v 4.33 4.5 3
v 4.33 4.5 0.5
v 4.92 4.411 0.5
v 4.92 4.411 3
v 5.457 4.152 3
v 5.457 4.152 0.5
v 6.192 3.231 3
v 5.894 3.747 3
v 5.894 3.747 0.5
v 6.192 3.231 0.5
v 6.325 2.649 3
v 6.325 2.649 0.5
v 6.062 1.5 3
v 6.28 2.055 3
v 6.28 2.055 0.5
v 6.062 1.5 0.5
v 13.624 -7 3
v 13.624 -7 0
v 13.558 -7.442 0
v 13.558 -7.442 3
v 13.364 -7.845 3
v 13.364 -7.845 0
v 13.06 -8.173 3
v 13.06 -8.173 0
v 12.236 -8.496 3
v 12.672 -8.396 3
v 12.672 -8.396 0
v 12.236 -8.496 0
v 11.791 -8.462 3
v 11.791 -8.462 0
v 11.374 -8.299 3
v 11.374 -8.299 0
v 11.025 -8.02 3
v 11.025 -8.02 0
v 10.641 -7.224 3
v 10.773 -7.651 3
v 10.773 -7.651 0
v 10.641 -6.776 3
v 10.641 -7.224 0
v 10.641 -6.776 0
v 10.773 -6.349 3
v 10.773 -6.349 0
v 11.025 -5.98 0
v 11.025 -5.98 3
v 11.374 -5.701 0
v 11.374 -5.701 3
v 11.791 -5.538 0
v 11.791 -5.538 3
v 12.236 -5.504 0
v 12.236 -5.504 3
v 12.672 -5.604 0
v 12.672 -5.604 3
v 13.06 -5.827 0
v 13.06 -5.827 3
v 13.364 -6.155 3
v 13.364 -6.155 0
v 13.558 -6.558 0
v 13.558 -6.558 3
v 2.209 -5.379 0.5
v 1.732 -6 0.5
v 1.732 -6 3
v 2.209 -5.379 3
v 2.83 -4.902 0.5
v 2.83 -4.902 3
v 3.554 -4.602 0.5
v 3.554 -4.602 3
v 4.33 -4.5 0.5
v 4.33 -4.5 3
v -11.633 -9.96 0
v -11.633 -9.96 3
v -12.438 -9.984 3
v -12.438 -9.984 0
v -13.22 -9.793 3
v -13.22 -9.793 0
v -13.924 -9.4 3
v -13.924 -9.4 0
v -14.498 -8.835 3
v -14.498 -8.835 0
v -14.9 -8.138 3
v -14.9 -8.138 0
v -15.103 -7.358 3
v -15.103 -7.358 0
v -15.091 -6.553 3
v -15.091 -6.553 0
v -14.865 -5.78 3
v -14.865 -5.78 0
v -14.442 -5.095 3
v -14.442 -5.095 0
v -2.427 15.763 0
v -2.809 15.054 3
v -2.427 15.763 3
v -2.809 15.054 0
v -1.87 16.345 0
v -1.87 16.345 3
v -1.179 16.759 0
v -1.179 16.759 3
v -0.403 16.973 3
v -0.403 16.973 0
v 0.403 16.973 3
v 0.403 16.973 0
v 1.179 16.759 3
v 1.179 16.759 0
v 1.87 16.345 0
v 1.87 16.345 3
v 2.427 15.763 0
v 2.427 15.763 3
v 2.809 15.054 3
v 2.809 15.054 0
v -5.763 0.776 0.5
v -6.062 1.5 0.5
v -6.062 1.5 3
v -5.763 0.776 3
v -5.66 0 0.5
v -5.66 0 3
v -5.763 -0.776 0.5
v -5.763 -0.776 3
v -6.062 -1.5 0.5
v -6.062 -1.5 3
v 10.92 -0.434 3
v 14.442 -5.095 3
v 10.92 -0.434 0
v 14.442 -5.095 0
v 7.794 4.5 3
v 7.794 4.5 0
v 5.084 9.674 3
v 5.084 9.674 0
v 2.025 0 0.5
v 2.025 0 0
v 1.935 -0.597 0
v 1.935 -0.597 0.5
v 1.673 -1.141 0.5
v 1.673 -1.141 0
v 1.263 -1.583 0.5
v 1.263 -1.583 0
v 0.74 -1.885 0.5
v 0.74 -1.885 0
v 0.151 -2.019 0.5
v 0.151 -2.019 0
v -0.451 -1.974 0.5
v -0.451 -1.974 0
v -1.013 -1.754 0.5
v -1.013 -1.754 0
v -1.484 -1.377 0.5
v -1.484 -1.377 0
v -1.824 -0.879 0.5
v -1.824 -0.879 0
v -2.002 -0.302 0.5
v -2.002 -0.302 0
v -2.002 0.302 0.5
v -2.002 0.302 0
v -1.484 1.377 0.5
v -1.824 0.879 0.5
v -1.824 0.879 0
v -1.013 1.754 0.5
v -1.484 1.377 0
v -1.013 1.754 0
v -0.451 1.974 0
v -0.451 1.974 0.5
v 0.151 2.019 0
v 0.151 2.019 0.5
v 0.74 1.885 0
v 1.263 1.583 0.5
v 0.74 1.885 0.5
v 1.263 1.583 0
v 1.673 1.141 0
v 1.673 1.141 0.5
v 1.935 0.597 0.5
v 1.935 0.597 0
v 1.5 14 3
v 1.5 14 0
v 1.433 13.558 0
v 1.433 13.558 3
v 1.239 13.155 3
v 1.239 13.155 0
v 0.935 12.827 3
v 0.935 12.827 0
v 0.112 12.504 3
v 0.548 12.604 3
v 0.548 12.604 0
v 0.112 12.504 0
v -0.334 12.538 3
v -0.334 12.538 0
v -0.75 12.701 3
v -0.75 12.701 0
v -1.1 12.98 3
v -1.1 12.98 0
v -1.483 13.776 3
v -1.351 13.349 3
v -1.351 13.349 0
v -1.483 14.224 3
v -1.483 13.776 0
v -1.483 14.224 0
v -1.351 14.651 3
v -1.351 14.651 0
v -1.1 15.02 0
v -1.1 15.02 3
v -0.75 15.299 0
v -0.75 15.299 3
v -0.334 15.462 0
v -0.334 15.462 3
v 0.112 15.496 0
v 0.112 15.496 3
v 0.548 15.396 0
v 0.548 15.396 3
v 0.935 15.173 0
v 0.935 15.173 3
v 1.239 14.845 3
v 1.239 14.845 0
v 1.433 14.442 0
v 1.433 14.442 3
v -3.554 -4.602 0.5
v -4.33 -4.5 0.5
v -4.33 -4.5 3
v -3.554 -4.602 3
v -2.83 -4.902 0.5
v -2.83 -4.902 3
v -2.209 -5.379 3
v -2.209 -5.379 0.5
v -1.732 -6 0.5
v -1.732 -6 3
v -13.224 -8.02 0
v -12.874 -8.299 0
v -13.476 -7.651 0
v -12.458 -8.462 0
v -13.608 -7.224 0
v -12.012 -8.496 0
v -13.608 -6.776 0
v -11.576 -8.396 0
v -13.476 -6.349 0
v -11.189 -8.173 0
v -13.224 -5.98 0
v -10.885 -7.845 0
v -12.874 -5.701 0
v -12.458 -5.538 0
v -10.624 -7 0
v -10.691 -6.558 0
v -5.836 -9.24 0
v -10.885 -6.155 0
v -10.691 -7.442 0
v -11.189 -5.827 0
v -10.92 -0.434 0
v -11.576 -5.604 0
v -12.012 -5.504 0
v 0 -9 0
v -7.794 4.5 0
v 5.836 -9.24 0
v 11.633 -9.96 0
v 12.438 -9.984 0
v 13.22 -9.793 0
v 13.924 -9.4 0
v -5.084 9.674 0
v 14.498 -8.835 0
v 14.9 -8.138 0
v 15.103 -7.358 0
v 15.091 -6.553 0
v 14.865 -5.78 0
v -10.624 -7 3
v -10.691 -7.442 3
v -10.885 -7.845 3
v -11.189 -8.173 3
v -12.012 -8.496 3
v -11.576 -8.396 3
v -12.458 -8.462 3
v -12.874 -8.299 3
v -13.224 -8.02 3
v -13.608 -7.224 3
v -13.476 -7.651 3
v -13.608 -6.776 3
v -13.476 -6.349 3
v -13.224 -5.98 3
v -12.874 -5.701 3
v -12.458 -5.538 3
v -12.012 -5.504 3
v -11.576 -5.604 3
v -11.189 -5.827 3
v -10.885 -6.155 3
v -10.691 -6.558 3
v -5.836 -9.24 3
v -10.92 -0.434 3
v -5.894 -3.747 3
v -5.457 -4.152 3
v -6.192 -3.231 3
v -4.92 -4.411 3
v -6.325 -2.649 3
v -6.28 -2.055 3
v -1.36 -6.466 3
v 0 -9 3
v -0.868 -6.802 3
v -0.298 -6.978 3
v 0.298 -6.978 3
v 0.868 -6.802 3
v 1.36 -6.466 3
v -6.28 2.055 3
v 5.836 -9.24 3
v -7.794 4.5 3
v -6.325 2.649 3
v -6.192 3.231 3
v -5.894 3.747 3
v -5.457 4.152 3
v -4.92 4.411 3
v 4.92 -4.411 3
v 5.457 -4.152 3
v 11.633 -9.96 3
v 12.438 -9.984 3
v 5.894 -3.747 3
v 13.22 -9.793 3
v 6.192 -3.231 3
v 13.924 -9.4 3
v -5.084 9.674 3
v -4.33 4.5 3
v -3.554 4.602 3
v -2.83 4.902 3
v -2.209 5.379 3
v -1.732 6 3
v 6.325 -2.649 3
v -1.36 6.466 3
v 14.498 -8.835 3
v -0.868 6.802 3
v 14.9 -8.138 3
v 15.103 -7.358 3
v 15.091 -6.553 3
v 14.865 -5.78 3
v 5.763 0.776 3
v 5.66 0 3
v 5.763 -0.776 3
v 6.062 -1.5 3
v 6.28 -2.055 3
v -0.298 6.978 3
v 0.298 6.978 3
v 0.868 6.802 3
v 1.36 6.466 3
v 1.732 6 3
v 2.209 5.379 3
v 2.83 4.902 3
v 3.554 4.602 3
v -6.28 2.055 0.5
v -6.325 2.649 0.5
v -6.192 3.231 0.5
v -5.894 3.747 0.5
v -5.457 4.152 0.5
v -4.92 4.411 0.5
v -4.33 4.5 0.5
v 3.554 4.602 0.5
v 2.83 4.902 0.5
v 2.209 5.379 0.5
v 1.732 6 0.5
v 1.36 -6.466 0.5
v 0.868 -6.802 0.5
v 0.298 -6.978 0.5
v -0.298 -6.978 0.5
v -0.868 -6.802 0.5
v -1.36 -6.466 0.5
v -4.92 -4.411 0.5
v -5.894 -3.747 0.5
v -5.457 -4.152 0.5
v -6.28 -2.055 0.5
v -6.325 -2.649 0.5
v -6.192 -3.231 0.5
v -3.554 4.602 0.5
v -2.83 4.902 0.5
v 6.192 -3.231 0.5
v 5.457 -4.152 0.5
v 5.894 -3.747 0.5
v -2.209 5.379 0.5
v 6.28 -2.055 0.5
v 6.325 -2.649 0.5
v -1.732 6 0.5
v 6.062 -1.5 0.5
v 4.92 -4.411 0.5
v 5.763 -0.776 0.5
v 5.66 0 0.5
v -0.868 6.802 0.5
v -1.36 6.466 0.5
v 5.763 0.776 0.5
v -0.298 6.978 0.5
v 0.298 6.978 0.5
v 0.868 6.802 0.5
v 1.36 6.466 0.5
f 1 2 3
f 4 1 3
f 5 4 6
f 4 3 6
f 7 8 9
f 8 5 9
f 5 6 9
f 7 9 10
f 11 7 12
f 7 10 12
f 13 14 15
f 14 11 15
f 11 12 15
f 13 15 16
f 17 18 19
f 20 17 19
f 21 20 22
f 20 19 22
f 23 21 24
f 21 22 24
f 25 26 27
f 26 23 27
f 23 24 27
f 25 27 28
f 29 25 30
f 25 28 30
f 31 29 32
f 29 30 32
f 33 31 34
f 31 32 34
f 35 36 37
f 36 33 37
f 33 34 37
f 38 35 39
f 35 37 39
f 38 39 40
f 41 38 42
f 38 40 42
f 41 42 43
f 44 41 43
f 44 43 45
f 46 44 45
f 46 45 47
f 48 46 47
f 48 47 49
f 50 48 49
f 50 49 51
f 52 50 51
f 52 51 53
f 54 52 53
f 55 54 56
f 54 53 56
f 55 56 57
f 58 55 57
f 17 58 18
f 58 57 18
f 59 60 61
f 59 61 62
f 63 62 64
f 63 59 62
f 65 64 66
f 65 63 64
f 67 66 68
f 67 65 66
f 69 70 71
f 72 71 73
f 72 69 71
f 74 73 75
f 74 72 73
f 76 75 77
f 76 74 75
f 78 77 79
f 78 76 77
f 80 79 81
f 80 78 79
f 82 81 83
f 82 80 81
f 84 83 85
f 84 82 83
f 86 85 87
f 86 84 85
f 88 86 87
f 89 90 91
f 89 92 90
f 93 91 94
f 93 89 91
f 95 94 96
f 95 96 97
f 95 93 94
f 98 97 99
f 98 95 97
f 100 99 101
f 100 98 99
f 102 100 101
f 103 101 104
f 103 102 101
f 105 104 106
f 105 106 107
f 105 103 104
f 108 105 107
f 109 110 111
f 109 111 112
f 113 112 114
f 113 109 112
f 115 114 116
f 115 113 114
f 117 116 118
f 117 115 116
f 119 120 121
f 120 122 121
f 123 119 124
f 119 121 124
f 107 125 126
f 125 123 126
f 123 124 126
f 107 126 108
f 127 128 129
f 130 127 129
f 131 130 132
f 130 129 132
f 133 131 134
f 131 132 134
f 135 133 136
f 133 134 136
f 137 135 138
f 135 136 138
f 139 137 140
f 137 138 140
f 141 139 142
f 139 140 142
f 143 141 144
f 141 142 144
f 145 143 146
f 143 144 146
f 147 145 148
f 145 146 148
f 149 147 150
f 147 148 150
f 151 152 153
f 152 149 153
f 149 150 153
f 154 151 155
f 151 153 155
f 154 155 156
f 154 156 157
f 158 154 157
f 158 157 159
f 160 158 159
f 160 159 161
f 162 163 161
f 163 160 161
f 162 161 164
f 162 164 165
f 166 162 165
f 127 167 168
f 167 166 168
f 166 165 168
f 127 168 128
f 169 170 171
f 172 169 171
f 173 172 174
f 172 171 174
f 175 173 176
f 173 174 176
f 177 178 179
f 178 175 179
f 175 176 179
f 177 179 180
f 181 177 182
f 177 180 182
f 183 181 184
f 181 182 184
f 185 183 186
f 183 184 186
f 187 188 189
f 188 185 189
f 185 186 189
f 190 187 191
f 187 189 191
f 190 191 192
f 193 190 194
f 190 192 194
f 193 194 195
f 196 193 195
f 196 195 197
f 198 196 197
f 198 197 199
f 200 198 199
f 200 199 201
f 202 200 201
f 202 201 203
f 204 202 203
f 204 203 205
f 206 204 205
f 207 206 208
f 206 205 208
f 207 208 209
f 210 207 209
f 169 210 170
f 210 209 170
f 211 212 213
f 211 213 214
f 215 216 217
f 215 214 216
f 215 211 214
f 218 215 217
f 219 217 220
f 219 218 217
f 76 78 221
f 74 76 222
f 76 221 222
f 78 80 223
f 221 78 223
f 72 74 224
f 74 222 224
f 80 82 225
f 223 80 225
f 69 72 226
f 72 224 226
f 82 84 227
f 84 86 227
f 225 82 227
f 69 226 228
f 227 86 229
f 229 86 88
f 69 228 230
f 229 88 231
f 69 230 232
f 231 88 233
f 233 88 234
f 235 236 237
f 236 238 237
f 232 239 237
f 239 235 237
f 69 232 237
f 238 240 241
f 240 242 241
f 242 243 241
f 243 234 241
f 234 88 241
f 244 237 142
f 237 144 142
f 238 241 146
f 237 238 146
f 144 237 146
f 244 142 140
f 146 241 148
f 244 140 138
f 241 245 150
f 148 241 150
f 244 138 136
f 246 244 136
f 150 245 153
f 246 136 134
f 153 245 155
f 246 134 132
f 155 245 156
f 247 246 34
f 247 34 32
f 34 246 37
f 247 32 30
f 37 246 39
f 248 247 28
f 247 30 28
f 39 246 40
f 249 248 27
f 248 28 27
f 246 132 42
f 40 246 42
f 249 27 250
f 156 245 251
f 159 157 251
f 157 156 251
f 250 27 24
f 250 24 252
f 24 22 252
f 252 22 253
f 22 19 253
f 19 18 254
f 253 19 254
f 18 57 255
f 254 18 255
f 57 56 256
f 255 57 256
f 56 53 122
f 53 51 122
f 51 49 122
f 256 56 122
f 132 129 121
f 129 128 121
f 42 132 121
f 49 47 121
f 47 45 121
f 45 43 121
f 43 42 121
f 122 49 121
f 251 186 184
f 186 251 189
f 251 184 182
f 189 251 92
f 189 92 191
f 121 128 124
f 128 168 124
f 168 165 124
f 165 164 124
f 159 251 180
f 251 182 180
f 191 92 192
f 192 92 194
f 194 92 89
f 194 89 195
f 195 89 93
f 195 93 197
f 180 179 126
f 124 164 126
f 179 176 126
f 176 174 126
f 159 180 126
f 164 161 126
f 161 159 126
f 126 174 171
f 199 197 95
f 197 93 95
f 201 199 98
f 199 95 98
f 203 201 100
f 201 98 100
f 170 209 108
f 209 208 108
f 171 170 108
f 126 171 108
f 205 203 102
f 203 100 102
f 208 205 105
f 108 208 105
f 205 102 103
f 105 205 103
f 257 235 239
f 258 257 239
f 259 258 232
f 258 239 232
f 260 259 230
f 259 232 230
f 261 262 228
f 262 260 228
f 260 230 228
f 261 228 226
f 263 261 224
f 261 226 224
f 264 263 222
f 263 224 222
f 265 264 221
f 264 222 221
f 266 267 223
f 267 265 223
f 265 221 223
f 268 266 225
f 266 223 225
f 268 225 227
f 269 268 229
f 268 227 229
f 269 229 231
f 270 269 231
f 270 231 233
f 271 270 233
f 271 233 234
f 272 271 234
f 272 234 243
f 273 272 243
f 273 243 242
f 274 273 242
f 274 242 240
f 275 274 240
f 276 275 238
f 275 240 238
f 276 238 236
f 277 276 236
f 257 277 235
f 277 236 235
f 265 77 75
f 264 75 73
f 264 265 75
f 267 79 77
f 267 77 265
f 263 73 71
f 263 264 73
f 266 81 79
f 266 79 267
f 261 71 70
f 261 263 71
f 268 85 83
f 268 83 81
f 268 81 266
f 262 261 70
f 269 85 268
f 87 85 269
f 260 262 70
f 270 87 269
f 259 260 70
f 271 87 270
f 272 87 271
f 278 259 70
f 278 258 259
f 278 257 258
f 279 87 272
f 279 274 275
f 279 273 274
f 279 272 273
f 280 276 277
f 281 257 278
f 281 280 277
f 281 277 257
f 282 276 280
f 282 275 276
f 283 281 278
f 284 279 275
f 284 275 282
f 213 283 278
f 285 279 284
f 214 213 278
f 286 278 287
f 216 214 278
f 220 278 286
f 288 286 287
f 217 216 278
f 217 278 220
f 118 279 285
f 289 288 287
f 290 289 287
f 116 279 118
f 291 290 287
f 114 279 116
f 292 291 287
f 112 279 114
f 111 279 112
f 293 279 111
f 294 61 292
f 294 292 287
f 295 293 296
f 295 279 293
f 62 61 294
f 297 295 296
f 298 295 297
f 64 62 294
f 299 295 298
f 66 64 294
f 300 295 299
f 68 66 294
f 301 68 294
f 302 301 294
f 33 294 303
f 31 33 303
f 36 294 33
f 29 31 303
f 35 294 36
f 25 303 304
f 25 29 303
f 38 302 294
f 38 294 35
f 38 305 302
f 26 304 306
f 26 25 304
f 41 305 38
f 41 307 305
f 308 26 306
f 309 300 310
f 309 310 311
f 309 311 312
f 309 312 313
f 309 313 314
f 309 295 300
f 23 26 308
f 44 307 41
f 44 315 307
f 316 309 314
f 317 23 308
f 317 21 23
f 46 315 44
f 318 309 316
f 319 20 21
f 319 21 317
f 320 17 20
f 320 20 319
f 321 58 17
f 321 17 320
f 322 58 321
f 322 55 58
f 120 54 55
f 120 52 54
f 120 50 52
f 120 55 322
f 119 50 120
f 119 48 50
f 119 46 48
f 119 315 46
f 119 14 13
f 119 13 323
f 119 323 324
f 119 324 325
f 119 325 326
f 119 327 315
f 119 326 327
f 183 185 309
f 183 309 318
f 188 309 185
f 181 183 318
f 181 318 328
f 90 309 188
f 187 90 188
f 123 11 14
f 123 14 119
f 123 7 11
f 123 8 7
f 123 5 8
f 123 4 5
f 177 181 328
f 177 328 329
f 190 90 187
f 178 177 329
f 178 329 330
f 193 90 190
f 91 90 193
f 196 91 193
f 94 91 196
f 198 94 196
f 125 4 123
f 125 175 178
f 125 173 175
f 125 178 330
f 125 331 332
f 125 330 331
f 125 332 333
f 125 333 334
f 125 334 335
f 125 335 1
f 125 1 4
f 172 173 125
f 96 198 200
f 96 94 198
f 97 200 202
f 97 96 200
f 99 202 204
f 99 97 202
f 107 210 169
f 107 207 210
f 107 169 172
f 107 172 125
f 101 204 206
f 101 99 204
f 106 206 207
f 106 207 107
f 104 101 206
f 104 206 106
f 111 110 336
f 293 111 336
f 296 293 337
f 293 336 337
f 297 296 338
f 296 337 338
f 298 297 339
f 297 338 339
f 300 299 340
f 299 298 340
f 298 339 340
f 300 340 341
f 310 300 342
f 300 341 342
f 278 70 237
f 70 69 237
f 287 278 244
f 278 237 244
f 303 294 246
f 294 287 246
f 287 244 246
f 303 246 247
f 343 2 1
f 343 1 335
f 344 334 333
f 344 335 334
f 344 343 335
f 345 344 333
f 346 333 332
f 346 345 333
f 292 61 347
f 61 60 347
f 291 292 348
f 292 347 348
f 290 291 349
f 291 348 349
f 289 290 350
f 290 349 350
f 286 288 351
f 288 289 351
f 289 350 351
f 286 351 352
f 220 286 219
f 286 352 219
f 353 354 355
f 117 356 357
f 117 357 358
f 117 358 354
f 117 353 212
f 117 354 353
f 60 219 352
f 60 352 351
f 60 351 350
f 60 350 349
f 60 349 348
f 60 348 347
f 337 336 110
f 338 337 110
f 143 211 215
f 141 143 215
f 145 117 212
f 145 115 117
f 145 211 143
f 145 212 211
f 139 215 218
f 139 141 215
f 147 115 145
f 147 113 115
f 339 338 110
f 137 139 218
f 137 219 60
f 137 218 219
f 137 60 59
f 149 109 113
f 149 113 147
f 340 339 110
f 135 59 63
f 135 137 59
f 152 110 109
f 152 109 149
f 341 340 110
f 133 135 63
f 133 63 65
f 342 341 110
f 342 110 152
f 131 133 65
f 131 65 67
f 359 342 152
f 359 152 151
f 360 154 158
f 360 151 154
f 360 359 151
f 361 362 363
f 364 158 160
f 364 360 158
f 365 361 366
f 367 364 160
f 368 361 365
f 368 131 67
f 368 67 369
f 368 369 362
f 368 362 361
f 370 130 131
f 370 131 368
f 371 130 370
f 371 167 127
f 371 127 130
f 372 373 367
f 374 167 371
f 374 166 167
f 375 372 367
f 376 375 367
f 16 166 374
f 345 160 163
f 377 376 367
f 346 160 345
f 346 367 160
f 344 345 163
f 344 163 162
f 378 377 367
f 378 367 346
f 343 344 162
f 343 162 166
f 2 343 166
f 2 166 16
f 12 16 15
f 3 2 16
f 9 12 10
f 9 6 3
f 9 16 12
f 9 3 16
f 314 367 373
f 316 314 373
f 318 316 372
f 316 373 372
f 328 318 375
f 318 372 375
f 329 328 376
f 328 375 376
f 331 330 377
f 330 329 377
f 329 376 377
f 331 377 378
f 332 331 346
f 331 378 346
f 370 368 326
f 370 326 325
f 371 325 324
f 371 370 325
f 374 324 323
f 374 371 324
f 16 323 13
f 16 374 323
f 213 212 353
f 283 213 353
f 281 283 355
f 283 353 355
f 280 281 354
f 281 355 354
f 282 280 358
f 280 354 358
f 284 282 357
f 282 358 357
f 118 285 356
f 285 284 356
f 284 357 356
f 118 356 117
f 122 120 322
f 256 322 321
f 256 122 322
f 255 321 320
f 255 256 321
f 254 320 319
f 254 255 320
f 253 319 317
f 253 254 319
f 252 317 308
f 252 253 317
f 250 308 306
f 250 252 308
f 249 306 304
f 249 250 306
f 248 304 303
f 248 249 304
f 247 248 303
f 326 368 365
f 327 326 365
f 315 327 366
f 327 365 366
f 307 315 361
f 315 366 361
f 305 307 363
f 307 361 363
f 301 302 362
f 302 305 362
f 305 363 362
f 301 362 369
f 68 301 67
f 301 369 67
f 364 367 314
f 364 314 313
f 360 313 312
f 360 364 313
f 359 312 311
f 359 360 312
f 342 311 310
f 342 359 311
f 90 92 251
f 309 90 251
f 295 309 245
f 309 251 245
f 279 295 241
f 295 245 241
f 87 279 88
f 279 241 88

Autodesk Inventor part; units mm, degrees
ref_plane "YZ Plane" through (0, 0, 0) normal (1, 0, 0) x (0, 1, 0)
ref_plane "XZ Plane" through (0, 0, 0) normal (0, 1, 0) x (-1, 0, 0)
ref_plane "XY Plane" through (0, 0, 0) normal (0, 0, 1) x (1, 0, 0)
sketch "スケッチ1" plane through (0, 0, 0) normal (0, 0, 1) x (1, 0, 0)
  circle A0 centre (0, 0) radius 18.25
  circle A1 centre (0, 0) radius 17
  line L0 (0, 14) -> (12.1244, -7) construction
  line L1 (12.1244, -7) -> (-12.1244, -7) construction
  line L2 (-12.1244, -7) -> (0, 14) construction
  circle A2 centre (0, 14) radius 1.5
  circle A3 centre (-12.1244, -7) radius 1.5
  circle A4 centre (12.1244, -7) radius 1.5
  circle A5 centre (0, 14) radius 3
  circle A6 centre (-12.1244, -7) radius 3
  circle A7 centre (12.1244, -7) radius 3
  circle A8 centre (0, 0) radius 8 construction
  circle A9 centre (0, 0) radius 7 construction
  line L3 (0, 7) -> (6.0622, 3.5) construction
  line L4 (6.0622, 3.5) -> (6.0622, -3.5) construction
  line L5 (6.0622, -3.5) -> (0, -7) construction
  line L6 (0, -7) -> (-6.0622, -3.5) construction
  line L7 (-6.0622, -3.5) -> (-6.0622, 3.5) construction
  line L8 (-6.0622, 3.5) -> (0, 7) construction
  arc A10 (1.7321, 6) -> (-1.7321, 6) centre (0, 5) ccw
  arc A11 (-4.3301, 4.5) -> (-6.0622, 1.5) centre (-4.3301, 2.5) ccw
  arc A12 (-6.0622, -1.5) -> (-4.3301, -4.5) centre (-4.3301, -2.5) ccw
  arc A13 (-1.7321, -6) -> (1.7321, -6) centre (0, -5) ccw
  arc A14 (4.3301, -4.5) -> (6.0622, -1.5) centre (4.3301, -2.5) ccw
  arc A15 (6.0622, 1.5) -> (4.3301, 4.5) centre (4.3301, 2.5) ccw
  arc A16 (1.7321, 6) -> (4.3301, 4.5) centre (4.3301, 7.5) ccw
  arc A17 (-4.3301, 4.5) -> (-1.7321, 6) centre (-4.3301, 7.5) ccw
  arc A18 (-6.0622, -1.5) -> (-6.0622, 1.5) centre (-8.6603, 0) ccw
  arc A19 (-1.7321, -6) -> (-4.3301, -4.5) centre (-4.3301, -7.5) ccw
  arc A20 (4.3301, -4.5) -> (1.7321, -6) centre (4.3301, -7.5) ccw
  arc A21 (6.0622, 1.5) -> (6.0622, -1.5) centre (8.6603, 0) ccw
  circle A22 centre (0, 0) radius 5.6603 construction
  arc A23 (-14.4416, -5.0946) -> (-2.8087, 15.0541) centre (-69.282, 40) ccw
  arc A24 (11.6328, -9.9595) -> (-11.6328, -9.9595) centre (0, -80) ccw
  arc A25 (2.8087, 15.0541) -> (14.4416, -5.0946) centre (69.282, 40) ccw
  circle A26 centre (0, 0) radius 9 construction
  circle A27 centre (0, 0) radius 2.025
  point P0 (-15.3265, -15.7621)
  point P1 (-6.0622, -3.5)
  point P2 (0, -7)
  point P3 (6.0622, -3.5)
  point P4 (6.0622, 3.5)
  point P5 (-1.7321, -6)
  point P6 (-4.3301, -4.5)
  point P7 (-6.0622, -1.5)
  point P8 (-6.0622, 1.5)
  point P9 (-4.3301, 4.5)
  point P10 (6.0622, 1.5)
  point P11 (6.0622, -1.5)
  point P12 (4.3301, -4.5)
  point P13 (1.7321, -6)
  point P14 (-11.6328, -9.9595)
  point P15 (11.6328, -9.9595)
  point P16 (14.4416, -5.0946)
  point P17 (2.8087, 15.0541)
  dimension "d4" = 6
  dimension "d5" = 6
  dimension "d13" = 14
  dimension "d0" = 34
  dimension "d1" = 3
  dimension "d2" = 3
  dimension "d3" = 3
  dimension "d6" = 6
  dimension "d7" = 14
  dimension "d12" = 16
  dimension "d14" = 360
  dimension "d15" = 360
  dimension "d16" = 11.3205
  dimension "d17" = 3
  dimension "d18" = 2
  dimension "d21" = 360
  dimension "d23" = 18
  dimension "d28" = 4.05
extrude "押し出し1" add sketch "スケッチ1" along normal blind 3 contours A5 | A7 | A6 | A25 A7 A24 A6 A23 A5
extrude "押し出し2" add sketch "スケッチ1" along normal blind 0.5 contours A16 A15 A21 A14 A20 A13 A19 A12 A18 A11 A17 A10
properties part number "m0.5z80接続部品" material "アルミニウム 2014-T4"
